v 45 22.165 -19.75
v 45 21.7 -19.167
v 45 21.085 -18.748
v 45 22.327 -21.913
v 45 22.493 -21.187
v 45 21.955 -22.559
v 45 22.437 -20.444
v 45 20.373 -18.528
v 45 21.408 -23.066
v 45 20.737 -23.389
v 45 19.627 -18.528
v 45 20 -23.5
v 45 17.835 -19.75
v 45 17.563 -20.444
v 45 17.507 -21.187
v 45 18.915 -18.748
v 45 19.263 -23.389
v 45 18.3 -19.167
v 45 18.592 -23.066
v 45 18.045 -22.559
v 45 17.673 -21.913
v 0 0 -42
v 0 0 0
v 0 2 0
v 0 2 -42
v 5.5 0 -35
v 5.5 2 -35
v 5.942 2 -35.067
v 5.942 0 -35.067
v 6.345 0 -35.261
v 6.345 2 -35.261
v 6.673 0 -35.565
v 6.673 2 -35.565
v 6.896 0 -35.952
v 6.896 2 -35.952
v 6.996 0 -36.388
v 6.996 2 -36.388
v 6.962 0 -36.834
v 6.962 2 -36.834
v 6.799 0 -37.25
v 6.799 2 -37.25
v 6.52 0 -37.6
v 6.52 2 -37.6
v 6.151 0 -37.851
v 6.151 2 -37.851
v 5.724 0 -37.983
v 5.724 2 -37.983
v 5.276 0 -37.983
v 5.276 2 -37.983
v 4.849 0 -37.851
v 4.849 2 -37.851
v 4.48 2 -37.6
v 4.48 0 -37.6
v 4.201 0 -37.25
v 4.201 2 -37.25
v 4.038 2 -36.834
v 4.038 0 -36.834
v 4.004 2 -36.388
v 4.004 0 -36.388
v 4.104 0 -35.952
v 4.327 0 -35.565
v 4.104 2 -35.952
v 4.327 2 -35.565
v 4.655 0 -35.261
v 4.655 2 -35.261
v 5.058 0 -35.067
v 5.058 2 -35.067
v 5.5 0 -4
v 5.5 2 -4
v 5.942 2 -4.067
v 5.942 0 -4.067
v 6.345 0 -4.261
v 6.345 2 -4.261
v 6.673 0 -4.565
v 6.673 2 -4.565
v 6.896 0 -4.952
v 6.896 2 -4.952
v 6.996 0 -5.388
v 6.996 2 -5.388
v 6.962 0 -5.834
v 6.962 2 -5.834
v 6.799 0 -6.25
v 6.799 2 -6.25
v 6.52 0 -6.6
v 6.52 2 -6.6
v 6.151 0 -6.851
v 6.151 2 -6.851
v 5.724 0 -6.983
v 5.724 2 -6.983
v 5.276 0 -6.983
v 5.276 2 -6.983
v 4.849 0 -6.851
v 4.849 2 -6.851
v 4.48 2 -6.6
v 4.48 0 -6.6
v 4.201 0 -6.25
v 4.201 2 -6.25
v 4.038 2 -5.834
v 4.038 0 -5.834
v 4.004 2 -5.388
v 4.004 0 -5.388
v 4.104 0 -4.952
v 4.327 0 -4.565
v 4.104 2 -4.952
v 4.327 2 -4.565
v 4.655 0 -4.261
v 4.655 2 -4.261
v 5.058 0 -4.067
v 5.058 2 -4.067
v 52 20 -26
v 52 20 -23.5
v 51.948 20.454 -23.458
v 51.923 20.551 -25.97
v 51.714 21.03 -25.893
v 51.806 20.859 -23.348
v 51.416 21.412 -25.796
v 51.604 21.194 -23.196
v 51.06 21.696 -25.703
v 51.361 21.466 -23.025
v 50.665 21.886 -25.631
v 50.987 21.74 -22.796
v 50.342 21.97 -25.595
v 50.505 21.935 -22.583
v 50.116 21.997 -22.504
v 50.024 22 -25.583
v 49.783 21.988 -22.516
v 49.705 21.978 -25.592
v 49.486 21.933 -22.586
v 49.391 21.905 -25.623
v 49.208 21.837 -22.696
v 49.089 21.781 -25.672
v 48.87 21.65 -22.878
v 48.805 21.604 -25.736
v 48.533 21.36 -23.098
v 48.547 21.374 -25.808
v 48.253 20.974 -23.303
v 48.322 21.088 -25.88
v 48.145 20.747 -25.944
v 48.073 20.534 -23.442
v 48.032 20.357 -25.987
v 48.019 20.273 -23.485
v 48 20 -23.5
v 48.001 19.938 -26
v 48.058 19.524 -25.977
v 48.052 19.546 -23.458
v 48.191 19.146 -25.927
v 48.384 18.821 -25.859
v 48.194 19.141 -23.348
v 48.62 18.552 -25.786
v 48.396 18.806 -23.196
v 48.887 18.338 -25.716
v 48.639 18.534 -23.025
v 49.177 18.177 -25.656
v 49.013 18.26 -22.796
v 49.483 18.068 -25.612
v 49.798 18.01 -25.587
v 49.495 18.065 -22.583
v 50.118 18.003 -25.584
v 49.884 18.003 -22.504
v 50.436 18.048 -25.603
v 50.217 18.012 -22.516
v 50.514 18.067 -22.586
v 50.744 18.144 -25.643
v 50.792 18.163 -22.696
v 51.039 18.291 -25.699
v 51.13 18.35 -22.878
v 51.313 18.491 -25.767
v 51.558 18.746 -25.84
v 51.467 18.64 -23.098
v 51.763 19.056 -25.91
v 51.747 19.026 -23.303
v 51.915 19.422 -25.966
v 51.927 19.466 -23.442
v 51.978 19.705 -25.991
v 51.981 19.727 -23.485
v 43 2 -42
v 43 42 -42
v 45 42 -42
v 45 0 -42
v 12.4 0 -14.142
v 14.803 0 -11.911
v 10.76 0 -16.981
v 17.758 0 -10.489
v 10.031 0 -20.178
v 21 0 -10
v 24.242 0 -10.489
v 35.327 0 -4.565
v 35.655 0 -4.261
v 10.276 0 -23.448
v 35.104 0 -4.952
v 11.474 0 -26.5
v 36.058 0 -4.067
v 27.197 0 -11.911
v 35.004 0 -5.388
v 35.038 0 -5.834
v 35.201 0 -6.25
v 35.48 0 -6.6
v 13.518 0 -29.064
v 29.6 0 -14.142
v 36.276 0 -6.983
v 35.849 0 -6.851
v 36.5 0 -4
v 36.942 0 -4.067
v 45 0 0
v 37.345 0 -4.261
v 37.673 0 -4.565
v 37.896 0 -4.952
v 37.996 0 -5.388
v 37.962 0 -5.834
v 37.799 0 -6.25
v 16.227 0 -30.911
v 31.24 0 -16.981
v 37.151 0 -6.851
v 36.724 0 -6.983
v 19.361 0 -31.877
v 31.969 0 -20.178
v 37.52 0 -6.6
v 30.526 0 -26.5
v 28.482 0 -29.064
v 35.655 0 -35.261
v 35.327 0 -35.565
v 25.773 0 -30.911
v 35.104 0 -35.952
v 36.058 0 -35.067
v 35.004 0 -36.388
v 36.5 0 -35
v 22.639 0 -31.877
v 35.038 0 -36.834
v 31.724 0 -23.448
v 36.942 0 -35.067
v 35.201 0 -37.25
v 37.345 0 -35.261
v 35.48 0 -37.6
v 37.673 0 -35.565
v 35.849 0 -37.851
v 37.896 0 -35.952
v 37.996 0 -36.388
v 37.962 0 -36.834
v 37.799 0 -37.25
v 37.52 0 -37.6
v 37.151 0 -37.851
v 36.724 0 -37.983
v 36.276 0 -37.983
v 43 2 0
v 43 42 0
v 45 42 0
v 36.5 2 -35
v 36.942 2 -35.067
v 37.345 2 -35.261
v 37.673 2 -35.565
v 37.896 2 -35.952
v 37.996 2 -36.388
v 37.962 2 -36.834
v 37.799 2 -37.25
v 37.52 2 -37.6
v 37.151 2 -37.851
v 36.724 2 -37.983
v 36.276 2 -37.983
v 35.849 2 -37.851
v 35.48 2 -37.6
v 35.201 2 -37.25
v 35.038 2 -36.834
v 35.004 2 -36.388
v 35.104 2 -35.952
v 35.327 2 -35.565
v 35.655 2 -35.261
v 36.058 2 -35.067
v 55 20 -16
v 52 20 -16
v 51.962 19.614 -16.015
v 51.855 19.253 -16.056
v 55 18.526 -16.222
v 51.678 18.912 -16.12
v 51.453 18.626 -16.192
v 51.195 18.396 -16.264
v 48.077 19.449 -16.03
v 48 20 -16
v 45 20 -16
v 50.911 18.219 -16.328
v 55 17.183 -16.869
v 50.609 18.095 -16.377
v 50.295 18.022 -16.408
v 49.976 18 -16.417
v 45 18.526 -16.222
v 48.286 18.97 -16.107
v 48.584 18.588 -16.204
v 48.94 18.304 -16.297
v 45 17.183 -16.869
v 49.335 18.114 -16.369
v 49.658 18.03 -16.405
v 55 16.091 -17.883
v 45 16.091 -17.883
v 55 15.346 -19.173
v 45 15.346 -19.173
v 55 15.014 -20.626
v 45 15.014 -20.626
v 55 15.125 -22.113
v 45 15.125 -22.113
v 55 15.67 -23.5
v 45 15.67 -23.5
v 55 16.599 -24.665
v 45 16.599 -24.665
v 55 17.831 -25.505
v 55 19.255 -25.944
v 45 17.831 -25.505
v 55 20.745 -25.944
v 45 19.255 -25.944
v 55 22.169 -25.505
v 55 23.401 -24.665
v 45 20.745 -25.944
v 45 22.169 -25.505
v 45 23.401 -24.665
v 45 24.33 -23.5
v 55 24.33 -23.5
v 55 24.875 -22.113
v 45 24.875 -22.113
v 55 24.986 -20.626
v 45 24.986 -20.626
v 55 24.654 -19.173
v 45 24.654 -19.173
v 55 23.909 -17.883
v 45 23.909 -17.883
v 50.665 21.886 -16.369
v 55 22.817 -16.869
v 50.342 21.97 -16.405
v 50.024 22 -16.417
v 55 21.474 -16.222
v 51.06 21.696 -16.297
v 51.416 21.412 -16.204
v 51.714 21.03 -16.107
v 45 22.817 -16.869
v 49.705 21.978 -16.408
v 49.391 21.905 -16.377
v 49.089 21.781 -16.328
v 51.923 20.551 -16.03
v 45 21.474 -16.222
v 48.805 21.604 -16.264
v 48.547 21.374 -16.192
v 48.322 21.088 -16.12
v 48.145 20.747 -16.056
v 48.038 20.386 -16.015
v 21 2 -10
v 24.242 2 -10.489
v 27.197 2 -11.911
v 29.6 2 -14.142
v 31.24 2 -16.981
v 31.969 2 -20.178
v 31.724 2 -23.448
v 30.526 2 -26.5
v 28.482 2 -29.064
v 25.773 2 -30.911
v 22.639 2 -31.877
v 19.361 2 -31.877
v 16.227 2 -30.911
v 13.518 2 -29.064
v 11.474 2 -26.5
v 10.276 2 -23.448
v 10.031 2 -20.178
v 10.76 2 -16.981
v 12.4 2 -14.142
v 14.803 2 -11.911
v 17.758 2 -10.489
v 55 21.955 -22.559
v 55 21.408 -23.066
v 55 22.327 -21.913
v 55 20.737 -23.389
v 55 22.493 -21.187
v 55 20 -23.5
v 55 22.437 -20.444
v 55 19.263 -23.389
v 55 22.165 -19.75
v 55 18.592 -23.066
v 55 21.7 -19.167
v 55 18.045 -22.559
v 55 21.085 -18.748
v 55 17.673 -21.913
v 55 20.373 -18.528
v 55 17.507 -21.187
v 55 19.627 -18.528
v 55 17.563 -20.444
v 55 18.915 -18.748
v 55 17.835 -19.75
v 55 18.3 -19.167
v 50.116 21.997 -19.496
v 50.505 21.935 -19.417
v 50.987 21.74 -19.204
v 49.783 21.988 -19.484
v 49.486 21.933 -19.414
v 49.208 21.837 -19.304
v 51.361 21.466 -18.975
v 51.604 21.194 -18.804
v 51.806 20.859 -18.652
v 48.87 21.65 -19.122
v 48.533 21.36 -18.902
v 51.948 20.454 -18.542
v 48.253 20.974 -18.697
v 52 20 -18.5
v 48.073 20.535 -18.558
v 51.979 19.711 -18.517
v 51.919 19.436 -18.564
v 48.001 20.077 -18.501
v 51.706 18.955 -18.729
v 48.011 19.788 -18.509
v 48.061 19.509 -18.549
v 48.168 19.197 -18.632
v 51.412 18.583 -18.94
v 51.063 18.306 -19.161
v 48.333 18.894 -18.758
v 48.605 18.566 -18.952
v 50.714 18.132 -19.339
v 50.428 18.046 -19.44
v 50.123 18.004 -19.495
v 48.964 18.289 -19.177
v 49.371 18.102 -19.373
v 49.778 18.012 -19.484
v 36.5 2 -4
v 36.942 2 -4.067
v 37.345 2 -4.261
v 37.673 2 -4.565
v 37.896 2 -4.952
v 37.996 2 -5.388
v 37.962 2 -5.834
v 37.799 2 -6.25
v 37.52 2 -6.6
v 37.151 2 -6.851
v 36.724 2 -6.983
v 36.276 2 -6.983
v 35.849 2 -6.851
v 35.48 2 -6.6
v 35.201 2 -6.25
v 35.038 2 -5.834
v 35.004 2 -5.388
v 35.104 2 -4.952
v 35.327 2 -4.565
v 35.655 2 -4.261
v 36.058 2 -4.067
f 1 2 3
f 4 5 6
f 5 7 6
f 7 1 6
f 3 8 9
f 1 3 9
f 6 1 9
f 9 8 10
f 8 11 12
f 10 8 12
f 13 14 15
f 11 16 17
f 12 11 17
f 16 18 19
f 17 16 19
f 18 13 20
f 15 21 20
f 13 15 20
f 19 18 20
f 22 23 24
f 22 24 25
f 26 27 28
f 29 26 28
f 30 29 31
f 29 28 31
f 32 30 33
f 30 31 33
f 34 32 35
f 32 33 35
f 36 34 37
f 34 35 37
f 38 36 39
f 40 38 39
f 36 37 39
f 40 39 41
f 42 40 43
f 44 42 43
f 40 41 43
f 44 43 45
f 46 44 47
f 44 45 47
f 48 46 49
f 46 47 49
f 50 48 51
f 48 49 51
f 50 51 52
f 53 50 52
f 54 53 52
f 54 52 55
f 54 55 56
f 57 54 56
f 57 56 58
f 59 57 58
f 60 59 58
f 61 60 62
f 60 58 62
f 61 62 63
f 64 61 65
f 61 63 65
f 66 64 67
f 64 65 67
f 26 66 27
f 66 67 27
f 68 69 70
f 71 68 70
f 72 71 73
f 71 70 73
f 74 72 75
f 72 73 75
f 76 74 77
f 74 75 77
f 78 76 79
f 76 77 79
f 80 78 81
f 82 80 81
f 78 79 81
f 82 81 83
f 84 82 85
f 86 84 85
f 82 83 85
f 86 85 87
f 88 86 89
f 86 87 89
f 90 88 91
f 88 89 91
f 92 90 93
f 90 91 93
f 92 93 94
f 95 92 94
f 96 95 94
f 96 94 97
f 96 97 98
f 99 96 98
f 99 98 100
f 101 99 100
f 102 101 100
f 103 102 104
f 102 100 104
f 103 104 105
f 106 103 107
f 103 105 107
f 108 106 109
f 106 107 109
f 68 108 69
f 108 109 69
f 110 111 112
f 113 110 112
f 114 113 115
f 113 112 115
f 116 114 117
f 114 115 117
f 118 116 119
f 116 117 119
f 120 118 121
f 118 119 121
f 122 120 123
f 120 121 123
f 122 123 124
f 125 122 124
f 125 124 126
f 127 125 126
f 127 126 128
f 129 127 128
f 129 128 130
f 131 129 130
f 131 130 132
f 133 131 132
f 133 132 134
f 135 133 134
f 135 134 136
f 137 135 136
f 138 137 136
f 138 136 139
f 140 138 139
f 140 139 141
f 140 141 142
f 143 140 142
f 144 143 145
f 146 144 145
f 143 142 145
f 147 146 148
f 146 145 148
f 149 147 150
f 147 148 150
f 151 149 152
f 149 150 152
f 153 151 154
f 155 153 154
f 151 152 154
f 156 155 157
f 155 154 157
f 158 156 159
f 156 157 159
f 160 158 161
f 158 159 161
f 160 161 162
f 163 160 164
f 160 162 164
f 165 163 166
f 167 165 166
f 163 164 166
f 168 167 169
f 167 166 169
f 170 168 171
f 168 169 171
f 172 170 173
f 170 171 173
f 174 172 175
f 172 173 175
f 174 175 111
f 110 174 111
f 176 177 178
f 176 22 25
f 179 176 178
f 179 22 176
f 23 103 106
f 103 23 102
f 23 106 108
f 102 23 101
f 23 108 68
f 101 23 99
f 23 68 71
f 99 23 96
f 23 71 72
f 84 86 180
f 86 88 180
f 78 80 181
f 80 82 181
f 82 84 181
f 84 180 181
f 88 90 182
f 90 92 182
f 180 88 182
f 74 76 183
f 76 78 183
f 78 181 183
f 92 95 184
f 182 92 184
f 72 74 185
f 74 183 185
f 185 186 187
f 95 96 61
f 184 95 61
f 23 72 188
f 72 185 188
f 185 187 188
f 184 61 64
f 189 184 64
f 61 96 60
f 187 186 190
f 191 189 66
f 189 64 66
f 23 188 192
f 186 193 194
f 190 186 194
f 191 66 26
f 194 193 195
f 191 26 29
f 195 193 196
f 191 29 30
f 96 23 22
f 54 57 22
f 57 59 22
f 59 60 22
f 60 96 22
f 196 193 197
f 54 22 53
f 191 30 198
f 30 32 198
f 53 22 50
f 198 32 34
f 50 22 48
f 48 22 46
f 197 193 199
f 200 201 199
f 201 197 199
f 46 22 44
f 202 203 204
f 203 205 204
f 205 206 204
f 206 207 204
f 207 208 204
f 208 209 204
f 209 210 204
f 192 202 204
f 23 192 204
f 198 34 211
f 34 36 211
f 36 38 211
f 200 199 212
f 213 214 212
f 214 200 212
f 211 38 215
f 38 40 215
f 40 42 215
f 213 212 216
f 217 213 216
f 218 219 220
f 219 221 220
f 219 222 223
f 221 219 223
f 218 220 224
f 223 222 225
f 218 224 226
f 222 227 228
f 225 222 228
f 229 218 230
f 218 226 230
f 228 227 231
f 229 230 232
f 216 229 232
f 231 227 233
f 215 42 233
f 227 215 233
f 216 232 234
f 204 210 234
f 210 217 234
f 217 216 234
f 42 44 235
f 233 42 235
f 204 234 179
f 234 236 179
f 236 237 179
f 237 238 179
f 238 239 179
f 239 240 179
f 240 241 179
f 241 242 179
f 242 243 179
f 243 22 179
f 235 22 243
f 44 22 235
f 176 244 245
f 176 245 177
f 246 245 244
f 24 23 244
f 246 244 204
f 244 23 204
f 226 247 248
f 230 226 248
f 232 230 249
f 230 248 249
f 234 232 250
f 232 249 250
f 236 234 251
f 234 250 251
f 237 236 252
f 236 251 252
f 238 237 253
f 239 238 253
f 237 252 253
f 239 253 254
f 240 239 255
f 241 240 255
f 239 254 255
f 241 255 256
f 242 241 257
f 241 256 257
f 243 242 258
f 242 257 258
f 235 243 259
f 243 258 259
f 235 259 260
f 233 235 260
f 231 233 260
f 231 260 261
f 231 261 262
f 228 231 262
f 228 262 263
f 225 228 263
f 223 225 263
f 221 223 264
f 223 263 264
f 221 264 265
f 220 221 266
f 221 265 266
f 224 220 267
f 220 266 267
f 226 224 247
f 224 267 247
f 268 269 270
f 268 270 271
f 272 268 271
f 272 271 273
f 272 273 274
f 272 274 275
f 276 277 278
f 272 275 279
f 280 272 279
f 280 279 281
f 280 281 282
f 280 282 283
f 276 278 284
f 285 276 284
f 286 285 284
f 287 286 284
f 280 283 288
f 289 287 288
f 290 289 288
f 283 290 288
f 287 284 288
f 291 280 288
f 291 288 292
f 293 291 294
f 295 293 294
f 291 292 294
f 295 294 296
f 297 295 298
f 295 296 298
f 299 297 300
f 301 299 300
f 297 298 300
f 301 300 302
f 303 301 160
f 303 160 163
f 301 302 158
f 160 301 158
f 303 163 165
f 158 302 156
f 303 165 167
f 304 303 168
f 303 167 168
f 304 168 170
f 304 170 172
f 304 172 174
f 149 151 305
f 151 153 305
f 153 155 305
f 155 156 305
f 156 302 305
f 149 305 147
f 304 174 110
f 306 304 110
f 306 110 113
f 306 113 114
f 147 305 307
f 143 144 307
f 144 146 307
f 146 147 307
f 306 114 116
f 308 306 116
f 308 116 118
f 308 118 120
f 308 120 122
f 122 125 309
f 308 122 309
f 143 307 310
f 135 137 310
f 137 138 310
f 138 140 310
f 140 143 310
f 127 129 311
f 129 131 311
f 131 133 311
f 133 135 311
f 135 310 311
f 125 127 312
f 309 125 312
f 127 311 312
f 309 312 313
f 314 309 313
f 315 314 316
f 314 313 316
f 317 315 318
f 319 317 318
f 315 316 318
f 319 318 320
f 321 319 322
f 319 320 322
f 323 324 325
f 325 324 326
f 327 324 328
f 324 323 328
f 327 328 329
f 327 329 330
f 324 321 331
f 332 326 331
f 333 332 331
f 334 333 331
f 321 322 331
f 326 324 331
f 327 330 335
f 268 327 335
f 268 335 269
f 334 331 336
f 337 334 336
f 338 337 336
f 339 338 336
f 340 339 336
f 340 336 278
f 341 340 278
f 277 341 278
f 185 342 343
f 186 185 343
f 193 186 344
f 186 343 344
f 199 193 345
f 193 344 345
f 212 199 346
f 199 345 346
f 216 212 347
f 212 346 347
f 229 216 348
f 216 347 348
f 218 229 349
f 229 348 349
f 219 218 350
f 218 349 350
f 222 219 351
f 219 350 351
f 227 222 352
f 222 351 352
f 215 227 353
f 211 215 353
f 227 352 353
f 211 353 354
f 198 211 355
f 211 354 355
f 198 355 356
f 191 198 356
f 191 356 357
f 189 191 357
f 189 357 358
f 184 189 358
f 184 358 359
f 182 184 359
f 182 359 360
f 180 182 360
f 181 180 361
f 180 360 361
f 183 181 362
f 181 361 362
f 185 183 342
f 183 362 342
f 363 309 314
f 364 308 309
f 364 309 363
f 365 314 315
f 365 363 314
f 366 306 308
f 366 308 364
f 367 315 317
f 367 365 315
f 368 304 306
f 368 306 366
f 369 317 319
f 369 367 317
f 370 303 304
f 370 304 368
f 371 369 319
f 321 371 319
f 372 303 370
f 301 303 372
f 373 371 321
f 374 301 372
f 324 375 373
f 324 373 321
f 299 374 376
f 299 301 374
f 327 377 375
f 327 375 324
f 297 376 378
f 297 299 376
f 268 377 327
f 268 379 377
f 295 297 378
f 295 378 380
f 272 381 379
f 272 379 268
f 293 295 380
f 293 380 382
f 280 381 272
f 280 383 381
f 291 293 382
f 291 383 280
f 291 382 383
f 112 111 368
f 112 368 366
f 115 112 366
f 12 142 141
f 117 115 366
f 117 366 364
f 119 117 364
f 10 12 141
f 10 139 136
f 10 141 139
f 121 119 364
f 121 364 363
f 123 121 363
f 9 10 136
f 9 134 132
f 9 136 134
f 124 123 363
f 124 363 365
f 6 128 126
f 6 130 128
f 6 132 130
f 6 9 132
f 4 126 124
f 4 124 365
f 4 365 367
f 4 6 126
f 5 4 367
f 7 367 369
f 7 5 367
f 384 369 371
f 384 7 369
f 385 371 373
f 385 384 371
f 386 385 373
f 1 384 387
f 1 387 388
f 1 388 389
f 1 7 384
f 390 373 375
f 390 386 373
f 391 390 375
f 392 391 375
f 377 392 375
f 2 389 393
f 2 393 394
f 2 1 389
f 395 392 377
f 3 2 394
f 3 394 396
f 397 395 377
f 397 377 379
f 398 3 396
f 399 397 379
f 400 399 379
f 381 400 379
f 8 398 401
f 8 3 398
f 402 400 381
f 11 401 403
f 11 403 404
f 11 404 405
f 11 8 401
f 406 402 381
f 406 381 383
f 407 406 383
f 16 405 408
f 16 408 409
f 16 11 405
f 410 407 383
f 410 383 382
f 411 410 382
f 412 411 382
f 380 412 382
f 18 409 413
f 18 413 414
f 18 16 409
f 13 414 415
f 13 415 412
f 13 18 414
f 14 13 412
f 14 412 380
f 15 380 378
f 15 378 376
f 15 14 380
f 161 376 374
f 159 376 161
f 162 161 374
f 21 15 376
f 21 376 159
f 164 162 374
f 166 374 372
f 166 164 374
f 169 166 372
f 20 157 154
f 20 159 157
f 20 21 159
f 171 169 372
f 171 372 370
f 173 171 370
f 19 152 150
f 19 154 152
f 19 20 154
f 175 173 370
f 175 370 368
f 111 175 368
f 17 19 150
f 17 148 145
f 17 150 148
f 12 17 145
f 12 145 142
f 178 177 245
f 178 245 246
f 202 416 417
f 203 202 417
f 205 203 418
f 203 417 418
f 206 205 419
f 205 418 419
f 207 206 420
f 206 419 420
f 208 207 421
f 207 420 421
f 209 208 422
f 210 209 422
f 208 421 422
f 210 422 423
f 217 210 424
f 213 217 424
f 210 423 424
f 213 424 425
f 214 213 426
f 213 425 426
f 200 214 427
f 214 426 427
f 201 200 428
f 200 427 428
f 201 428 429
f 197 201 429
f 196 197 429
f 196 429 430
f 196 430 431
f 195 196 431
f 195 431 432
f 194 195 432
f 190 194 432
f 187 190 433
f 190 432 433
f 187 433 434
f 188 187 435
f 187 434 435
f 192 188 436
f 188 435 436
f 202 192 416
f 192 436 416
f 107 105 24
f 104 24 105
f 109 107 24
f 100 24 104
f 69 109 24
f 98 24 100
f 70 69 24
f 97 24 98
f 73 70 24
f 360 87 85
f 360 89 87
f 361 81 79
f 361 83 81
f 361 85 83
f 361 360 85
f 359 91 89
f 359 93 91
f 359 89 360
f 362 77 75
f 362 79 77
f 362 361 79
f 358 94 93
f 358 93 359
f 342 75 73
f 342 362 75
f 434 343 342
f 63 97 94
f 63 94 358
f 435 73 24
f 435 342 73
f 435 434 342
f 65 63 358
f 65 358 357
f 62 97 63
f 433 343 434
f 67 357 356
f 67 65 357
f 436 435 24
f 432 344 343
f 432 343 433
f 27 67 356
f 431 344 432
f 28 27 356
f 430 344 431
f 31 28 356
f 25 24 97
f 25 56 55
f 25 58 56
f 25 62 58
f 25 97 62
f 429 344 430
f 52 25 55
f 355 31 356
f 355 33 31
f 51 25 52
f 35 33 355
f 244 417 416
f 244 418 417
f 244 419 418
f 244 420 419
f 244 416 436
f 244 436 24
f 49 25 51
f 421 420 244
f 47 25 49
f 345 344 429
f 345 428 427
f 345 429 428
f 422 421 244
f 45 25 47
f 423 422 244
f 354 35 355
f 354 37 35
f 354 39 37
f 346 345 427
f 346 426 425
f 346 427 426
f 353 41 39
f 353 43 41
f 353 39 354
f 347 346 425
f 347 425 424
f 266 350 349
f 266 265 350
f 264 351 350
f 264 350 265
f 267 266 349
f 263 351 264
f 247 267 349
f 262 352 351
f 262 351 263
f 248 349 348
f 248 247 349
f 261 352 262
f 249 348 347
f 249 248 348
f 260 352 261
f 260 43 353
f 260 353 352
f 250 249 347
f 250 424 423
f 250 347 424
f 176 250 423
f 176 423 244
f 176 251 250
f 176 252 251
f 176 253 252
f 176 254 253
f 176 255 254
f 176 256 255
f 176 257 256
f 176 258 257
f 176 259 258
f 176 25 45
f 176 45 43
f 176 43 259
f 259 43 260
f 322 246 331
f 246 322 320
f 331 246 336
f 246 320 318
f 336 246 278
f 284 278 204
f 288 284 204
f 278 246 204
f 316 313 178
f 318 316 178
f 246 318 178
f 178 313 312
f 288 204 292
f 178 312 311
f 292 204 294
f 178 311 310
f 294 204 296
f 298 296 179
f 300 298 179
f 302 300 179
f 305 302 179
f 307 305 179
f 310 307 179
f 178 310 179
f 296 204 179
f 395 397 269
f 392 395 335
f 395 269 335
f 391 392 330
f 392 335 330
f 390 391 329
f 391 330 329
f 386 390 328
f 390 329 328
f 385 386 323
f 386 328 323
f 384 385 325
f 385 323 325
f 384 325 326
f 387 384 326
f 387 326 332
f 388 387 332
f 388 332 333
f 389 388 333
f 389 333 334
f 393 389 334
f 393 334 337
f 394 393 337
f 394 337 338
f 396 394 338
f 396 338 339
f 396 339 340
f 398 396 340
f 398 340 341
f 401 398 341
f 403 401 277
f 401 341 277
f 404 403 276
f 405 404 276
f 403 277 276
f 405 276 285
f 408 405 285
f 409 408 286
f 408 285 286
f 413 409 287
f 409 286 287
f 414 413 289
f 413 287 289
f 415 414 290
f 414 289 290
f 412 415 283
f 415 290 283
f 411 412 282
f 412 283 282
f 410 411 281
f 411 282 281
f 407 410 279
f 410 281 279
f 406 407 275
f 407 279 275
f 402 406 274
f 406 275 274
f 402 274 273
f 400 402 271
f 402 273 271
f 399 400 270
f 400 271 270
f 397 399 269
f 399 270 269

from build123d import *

# Parameters (mm, degrees)
SKETCH_1_W          = 45
SKETCH_1_H          = 42
EXTRUDE_1_DEPTH     = 2
SKETCH_2_R          = 11
SKETCH_2_R_2        = 1.5
CUT_EXTRUDE_1_DEPTH = 2
SKETCH_3_W          = 2
SKETCH_3_H          = 42
EXTRUDE_2_DEPTH     = 40
SKETCH_4_R          = 5
SKETCH_4_R_2        = 2.5
EXTRUDE_3_DEPTH     = 10
SKETCH_5_R          = 2
CUT_EXTRUDE_2_DEPTH = 81.950602221


with BuildPart() as part:
    # 草图1 → 凸台-拉伸1 (new body)
    with BuildSketch(Plane(origin=(0, 0, 0), x_dir=(1, 0, 0), z_dir=(0, 1, 0))):
        with Locations((22.5, 21)):
            Rectangle(SKETCH_1_W, SKETCH_1_H)
    extrude(amount=EXTRUDE_1_DEPTH)

    # 草图2 → 切除-拉伸1 (cut)
    with BuildSketch(Plane(origin=(0, 2, 0), x_dir=(1, 0, 0), z_dir=(0, 1, 0))):
        with Locations(Location((21, 21, 0), (0, 0, 270))):
            Circle(SKETCH_2_R)
        with Locations(Location((5.5, 5.5, 0), (0, 0, 270))):
            Circle(SKETCH_2_R_2)
        with Locations(Location((5.5, 36.5, 0), (0, 0, 270))):
            Circle(SKETCH_2_R_2)
        with Locations(Location((36.5, 36.5, 0), (0, 0, 270))):
            Circle(SKETCH_2_R_2)
        with Locations(Location((36.5, 5.5, 0), (0, 0, 270))):
            Circle(SKETCH_2_R_2)
    extrude(amount=-CUT_EXTRUDE_1_DEPTH, mode=Mode.SUBTRACT)

    # 草图3 → 凸台-拉伸2 (add)
    with BuildSketch(Plane(origin=(0, 2, 0), x_dir=(1, 0, 0), z_dir=(0, 1, 0))):
        with Locations((44, 21)):
            Rectangle(SKETCH_3_W, SKETCH_3_H)
    extrude(amount=EXTRUDE_2_DEPTH)

    # 草图4 → 凸台-拉伸3 (add)
    with BuildSketch(Plane(origin=(45, 0, 0), x_dir=(0, 0, -1), z_dir=(1, 0, 0))):
        with Locations(Location((21, 20, 0), (0, 0, 180))):
            Circle(SKETCH_4_R)
        with Locations((21, 20)):
            Circle(SKETCH_4_R_2, mode=Mode.SUBTRACT)
    extrude(amount=EXTRUDE_3_DEPTH)

    # 草图5 → 切除-拉伸2 (cut, through all)
    with BuildSketch(Plane.XY):
        with Locations((50, 20)):
            Circle(SKETCH_5_R)
    extrude(amount=-CUT_EXTRUDE_2_DEPTH, mode=Mode.SUBTRACT)


solid = part.part
